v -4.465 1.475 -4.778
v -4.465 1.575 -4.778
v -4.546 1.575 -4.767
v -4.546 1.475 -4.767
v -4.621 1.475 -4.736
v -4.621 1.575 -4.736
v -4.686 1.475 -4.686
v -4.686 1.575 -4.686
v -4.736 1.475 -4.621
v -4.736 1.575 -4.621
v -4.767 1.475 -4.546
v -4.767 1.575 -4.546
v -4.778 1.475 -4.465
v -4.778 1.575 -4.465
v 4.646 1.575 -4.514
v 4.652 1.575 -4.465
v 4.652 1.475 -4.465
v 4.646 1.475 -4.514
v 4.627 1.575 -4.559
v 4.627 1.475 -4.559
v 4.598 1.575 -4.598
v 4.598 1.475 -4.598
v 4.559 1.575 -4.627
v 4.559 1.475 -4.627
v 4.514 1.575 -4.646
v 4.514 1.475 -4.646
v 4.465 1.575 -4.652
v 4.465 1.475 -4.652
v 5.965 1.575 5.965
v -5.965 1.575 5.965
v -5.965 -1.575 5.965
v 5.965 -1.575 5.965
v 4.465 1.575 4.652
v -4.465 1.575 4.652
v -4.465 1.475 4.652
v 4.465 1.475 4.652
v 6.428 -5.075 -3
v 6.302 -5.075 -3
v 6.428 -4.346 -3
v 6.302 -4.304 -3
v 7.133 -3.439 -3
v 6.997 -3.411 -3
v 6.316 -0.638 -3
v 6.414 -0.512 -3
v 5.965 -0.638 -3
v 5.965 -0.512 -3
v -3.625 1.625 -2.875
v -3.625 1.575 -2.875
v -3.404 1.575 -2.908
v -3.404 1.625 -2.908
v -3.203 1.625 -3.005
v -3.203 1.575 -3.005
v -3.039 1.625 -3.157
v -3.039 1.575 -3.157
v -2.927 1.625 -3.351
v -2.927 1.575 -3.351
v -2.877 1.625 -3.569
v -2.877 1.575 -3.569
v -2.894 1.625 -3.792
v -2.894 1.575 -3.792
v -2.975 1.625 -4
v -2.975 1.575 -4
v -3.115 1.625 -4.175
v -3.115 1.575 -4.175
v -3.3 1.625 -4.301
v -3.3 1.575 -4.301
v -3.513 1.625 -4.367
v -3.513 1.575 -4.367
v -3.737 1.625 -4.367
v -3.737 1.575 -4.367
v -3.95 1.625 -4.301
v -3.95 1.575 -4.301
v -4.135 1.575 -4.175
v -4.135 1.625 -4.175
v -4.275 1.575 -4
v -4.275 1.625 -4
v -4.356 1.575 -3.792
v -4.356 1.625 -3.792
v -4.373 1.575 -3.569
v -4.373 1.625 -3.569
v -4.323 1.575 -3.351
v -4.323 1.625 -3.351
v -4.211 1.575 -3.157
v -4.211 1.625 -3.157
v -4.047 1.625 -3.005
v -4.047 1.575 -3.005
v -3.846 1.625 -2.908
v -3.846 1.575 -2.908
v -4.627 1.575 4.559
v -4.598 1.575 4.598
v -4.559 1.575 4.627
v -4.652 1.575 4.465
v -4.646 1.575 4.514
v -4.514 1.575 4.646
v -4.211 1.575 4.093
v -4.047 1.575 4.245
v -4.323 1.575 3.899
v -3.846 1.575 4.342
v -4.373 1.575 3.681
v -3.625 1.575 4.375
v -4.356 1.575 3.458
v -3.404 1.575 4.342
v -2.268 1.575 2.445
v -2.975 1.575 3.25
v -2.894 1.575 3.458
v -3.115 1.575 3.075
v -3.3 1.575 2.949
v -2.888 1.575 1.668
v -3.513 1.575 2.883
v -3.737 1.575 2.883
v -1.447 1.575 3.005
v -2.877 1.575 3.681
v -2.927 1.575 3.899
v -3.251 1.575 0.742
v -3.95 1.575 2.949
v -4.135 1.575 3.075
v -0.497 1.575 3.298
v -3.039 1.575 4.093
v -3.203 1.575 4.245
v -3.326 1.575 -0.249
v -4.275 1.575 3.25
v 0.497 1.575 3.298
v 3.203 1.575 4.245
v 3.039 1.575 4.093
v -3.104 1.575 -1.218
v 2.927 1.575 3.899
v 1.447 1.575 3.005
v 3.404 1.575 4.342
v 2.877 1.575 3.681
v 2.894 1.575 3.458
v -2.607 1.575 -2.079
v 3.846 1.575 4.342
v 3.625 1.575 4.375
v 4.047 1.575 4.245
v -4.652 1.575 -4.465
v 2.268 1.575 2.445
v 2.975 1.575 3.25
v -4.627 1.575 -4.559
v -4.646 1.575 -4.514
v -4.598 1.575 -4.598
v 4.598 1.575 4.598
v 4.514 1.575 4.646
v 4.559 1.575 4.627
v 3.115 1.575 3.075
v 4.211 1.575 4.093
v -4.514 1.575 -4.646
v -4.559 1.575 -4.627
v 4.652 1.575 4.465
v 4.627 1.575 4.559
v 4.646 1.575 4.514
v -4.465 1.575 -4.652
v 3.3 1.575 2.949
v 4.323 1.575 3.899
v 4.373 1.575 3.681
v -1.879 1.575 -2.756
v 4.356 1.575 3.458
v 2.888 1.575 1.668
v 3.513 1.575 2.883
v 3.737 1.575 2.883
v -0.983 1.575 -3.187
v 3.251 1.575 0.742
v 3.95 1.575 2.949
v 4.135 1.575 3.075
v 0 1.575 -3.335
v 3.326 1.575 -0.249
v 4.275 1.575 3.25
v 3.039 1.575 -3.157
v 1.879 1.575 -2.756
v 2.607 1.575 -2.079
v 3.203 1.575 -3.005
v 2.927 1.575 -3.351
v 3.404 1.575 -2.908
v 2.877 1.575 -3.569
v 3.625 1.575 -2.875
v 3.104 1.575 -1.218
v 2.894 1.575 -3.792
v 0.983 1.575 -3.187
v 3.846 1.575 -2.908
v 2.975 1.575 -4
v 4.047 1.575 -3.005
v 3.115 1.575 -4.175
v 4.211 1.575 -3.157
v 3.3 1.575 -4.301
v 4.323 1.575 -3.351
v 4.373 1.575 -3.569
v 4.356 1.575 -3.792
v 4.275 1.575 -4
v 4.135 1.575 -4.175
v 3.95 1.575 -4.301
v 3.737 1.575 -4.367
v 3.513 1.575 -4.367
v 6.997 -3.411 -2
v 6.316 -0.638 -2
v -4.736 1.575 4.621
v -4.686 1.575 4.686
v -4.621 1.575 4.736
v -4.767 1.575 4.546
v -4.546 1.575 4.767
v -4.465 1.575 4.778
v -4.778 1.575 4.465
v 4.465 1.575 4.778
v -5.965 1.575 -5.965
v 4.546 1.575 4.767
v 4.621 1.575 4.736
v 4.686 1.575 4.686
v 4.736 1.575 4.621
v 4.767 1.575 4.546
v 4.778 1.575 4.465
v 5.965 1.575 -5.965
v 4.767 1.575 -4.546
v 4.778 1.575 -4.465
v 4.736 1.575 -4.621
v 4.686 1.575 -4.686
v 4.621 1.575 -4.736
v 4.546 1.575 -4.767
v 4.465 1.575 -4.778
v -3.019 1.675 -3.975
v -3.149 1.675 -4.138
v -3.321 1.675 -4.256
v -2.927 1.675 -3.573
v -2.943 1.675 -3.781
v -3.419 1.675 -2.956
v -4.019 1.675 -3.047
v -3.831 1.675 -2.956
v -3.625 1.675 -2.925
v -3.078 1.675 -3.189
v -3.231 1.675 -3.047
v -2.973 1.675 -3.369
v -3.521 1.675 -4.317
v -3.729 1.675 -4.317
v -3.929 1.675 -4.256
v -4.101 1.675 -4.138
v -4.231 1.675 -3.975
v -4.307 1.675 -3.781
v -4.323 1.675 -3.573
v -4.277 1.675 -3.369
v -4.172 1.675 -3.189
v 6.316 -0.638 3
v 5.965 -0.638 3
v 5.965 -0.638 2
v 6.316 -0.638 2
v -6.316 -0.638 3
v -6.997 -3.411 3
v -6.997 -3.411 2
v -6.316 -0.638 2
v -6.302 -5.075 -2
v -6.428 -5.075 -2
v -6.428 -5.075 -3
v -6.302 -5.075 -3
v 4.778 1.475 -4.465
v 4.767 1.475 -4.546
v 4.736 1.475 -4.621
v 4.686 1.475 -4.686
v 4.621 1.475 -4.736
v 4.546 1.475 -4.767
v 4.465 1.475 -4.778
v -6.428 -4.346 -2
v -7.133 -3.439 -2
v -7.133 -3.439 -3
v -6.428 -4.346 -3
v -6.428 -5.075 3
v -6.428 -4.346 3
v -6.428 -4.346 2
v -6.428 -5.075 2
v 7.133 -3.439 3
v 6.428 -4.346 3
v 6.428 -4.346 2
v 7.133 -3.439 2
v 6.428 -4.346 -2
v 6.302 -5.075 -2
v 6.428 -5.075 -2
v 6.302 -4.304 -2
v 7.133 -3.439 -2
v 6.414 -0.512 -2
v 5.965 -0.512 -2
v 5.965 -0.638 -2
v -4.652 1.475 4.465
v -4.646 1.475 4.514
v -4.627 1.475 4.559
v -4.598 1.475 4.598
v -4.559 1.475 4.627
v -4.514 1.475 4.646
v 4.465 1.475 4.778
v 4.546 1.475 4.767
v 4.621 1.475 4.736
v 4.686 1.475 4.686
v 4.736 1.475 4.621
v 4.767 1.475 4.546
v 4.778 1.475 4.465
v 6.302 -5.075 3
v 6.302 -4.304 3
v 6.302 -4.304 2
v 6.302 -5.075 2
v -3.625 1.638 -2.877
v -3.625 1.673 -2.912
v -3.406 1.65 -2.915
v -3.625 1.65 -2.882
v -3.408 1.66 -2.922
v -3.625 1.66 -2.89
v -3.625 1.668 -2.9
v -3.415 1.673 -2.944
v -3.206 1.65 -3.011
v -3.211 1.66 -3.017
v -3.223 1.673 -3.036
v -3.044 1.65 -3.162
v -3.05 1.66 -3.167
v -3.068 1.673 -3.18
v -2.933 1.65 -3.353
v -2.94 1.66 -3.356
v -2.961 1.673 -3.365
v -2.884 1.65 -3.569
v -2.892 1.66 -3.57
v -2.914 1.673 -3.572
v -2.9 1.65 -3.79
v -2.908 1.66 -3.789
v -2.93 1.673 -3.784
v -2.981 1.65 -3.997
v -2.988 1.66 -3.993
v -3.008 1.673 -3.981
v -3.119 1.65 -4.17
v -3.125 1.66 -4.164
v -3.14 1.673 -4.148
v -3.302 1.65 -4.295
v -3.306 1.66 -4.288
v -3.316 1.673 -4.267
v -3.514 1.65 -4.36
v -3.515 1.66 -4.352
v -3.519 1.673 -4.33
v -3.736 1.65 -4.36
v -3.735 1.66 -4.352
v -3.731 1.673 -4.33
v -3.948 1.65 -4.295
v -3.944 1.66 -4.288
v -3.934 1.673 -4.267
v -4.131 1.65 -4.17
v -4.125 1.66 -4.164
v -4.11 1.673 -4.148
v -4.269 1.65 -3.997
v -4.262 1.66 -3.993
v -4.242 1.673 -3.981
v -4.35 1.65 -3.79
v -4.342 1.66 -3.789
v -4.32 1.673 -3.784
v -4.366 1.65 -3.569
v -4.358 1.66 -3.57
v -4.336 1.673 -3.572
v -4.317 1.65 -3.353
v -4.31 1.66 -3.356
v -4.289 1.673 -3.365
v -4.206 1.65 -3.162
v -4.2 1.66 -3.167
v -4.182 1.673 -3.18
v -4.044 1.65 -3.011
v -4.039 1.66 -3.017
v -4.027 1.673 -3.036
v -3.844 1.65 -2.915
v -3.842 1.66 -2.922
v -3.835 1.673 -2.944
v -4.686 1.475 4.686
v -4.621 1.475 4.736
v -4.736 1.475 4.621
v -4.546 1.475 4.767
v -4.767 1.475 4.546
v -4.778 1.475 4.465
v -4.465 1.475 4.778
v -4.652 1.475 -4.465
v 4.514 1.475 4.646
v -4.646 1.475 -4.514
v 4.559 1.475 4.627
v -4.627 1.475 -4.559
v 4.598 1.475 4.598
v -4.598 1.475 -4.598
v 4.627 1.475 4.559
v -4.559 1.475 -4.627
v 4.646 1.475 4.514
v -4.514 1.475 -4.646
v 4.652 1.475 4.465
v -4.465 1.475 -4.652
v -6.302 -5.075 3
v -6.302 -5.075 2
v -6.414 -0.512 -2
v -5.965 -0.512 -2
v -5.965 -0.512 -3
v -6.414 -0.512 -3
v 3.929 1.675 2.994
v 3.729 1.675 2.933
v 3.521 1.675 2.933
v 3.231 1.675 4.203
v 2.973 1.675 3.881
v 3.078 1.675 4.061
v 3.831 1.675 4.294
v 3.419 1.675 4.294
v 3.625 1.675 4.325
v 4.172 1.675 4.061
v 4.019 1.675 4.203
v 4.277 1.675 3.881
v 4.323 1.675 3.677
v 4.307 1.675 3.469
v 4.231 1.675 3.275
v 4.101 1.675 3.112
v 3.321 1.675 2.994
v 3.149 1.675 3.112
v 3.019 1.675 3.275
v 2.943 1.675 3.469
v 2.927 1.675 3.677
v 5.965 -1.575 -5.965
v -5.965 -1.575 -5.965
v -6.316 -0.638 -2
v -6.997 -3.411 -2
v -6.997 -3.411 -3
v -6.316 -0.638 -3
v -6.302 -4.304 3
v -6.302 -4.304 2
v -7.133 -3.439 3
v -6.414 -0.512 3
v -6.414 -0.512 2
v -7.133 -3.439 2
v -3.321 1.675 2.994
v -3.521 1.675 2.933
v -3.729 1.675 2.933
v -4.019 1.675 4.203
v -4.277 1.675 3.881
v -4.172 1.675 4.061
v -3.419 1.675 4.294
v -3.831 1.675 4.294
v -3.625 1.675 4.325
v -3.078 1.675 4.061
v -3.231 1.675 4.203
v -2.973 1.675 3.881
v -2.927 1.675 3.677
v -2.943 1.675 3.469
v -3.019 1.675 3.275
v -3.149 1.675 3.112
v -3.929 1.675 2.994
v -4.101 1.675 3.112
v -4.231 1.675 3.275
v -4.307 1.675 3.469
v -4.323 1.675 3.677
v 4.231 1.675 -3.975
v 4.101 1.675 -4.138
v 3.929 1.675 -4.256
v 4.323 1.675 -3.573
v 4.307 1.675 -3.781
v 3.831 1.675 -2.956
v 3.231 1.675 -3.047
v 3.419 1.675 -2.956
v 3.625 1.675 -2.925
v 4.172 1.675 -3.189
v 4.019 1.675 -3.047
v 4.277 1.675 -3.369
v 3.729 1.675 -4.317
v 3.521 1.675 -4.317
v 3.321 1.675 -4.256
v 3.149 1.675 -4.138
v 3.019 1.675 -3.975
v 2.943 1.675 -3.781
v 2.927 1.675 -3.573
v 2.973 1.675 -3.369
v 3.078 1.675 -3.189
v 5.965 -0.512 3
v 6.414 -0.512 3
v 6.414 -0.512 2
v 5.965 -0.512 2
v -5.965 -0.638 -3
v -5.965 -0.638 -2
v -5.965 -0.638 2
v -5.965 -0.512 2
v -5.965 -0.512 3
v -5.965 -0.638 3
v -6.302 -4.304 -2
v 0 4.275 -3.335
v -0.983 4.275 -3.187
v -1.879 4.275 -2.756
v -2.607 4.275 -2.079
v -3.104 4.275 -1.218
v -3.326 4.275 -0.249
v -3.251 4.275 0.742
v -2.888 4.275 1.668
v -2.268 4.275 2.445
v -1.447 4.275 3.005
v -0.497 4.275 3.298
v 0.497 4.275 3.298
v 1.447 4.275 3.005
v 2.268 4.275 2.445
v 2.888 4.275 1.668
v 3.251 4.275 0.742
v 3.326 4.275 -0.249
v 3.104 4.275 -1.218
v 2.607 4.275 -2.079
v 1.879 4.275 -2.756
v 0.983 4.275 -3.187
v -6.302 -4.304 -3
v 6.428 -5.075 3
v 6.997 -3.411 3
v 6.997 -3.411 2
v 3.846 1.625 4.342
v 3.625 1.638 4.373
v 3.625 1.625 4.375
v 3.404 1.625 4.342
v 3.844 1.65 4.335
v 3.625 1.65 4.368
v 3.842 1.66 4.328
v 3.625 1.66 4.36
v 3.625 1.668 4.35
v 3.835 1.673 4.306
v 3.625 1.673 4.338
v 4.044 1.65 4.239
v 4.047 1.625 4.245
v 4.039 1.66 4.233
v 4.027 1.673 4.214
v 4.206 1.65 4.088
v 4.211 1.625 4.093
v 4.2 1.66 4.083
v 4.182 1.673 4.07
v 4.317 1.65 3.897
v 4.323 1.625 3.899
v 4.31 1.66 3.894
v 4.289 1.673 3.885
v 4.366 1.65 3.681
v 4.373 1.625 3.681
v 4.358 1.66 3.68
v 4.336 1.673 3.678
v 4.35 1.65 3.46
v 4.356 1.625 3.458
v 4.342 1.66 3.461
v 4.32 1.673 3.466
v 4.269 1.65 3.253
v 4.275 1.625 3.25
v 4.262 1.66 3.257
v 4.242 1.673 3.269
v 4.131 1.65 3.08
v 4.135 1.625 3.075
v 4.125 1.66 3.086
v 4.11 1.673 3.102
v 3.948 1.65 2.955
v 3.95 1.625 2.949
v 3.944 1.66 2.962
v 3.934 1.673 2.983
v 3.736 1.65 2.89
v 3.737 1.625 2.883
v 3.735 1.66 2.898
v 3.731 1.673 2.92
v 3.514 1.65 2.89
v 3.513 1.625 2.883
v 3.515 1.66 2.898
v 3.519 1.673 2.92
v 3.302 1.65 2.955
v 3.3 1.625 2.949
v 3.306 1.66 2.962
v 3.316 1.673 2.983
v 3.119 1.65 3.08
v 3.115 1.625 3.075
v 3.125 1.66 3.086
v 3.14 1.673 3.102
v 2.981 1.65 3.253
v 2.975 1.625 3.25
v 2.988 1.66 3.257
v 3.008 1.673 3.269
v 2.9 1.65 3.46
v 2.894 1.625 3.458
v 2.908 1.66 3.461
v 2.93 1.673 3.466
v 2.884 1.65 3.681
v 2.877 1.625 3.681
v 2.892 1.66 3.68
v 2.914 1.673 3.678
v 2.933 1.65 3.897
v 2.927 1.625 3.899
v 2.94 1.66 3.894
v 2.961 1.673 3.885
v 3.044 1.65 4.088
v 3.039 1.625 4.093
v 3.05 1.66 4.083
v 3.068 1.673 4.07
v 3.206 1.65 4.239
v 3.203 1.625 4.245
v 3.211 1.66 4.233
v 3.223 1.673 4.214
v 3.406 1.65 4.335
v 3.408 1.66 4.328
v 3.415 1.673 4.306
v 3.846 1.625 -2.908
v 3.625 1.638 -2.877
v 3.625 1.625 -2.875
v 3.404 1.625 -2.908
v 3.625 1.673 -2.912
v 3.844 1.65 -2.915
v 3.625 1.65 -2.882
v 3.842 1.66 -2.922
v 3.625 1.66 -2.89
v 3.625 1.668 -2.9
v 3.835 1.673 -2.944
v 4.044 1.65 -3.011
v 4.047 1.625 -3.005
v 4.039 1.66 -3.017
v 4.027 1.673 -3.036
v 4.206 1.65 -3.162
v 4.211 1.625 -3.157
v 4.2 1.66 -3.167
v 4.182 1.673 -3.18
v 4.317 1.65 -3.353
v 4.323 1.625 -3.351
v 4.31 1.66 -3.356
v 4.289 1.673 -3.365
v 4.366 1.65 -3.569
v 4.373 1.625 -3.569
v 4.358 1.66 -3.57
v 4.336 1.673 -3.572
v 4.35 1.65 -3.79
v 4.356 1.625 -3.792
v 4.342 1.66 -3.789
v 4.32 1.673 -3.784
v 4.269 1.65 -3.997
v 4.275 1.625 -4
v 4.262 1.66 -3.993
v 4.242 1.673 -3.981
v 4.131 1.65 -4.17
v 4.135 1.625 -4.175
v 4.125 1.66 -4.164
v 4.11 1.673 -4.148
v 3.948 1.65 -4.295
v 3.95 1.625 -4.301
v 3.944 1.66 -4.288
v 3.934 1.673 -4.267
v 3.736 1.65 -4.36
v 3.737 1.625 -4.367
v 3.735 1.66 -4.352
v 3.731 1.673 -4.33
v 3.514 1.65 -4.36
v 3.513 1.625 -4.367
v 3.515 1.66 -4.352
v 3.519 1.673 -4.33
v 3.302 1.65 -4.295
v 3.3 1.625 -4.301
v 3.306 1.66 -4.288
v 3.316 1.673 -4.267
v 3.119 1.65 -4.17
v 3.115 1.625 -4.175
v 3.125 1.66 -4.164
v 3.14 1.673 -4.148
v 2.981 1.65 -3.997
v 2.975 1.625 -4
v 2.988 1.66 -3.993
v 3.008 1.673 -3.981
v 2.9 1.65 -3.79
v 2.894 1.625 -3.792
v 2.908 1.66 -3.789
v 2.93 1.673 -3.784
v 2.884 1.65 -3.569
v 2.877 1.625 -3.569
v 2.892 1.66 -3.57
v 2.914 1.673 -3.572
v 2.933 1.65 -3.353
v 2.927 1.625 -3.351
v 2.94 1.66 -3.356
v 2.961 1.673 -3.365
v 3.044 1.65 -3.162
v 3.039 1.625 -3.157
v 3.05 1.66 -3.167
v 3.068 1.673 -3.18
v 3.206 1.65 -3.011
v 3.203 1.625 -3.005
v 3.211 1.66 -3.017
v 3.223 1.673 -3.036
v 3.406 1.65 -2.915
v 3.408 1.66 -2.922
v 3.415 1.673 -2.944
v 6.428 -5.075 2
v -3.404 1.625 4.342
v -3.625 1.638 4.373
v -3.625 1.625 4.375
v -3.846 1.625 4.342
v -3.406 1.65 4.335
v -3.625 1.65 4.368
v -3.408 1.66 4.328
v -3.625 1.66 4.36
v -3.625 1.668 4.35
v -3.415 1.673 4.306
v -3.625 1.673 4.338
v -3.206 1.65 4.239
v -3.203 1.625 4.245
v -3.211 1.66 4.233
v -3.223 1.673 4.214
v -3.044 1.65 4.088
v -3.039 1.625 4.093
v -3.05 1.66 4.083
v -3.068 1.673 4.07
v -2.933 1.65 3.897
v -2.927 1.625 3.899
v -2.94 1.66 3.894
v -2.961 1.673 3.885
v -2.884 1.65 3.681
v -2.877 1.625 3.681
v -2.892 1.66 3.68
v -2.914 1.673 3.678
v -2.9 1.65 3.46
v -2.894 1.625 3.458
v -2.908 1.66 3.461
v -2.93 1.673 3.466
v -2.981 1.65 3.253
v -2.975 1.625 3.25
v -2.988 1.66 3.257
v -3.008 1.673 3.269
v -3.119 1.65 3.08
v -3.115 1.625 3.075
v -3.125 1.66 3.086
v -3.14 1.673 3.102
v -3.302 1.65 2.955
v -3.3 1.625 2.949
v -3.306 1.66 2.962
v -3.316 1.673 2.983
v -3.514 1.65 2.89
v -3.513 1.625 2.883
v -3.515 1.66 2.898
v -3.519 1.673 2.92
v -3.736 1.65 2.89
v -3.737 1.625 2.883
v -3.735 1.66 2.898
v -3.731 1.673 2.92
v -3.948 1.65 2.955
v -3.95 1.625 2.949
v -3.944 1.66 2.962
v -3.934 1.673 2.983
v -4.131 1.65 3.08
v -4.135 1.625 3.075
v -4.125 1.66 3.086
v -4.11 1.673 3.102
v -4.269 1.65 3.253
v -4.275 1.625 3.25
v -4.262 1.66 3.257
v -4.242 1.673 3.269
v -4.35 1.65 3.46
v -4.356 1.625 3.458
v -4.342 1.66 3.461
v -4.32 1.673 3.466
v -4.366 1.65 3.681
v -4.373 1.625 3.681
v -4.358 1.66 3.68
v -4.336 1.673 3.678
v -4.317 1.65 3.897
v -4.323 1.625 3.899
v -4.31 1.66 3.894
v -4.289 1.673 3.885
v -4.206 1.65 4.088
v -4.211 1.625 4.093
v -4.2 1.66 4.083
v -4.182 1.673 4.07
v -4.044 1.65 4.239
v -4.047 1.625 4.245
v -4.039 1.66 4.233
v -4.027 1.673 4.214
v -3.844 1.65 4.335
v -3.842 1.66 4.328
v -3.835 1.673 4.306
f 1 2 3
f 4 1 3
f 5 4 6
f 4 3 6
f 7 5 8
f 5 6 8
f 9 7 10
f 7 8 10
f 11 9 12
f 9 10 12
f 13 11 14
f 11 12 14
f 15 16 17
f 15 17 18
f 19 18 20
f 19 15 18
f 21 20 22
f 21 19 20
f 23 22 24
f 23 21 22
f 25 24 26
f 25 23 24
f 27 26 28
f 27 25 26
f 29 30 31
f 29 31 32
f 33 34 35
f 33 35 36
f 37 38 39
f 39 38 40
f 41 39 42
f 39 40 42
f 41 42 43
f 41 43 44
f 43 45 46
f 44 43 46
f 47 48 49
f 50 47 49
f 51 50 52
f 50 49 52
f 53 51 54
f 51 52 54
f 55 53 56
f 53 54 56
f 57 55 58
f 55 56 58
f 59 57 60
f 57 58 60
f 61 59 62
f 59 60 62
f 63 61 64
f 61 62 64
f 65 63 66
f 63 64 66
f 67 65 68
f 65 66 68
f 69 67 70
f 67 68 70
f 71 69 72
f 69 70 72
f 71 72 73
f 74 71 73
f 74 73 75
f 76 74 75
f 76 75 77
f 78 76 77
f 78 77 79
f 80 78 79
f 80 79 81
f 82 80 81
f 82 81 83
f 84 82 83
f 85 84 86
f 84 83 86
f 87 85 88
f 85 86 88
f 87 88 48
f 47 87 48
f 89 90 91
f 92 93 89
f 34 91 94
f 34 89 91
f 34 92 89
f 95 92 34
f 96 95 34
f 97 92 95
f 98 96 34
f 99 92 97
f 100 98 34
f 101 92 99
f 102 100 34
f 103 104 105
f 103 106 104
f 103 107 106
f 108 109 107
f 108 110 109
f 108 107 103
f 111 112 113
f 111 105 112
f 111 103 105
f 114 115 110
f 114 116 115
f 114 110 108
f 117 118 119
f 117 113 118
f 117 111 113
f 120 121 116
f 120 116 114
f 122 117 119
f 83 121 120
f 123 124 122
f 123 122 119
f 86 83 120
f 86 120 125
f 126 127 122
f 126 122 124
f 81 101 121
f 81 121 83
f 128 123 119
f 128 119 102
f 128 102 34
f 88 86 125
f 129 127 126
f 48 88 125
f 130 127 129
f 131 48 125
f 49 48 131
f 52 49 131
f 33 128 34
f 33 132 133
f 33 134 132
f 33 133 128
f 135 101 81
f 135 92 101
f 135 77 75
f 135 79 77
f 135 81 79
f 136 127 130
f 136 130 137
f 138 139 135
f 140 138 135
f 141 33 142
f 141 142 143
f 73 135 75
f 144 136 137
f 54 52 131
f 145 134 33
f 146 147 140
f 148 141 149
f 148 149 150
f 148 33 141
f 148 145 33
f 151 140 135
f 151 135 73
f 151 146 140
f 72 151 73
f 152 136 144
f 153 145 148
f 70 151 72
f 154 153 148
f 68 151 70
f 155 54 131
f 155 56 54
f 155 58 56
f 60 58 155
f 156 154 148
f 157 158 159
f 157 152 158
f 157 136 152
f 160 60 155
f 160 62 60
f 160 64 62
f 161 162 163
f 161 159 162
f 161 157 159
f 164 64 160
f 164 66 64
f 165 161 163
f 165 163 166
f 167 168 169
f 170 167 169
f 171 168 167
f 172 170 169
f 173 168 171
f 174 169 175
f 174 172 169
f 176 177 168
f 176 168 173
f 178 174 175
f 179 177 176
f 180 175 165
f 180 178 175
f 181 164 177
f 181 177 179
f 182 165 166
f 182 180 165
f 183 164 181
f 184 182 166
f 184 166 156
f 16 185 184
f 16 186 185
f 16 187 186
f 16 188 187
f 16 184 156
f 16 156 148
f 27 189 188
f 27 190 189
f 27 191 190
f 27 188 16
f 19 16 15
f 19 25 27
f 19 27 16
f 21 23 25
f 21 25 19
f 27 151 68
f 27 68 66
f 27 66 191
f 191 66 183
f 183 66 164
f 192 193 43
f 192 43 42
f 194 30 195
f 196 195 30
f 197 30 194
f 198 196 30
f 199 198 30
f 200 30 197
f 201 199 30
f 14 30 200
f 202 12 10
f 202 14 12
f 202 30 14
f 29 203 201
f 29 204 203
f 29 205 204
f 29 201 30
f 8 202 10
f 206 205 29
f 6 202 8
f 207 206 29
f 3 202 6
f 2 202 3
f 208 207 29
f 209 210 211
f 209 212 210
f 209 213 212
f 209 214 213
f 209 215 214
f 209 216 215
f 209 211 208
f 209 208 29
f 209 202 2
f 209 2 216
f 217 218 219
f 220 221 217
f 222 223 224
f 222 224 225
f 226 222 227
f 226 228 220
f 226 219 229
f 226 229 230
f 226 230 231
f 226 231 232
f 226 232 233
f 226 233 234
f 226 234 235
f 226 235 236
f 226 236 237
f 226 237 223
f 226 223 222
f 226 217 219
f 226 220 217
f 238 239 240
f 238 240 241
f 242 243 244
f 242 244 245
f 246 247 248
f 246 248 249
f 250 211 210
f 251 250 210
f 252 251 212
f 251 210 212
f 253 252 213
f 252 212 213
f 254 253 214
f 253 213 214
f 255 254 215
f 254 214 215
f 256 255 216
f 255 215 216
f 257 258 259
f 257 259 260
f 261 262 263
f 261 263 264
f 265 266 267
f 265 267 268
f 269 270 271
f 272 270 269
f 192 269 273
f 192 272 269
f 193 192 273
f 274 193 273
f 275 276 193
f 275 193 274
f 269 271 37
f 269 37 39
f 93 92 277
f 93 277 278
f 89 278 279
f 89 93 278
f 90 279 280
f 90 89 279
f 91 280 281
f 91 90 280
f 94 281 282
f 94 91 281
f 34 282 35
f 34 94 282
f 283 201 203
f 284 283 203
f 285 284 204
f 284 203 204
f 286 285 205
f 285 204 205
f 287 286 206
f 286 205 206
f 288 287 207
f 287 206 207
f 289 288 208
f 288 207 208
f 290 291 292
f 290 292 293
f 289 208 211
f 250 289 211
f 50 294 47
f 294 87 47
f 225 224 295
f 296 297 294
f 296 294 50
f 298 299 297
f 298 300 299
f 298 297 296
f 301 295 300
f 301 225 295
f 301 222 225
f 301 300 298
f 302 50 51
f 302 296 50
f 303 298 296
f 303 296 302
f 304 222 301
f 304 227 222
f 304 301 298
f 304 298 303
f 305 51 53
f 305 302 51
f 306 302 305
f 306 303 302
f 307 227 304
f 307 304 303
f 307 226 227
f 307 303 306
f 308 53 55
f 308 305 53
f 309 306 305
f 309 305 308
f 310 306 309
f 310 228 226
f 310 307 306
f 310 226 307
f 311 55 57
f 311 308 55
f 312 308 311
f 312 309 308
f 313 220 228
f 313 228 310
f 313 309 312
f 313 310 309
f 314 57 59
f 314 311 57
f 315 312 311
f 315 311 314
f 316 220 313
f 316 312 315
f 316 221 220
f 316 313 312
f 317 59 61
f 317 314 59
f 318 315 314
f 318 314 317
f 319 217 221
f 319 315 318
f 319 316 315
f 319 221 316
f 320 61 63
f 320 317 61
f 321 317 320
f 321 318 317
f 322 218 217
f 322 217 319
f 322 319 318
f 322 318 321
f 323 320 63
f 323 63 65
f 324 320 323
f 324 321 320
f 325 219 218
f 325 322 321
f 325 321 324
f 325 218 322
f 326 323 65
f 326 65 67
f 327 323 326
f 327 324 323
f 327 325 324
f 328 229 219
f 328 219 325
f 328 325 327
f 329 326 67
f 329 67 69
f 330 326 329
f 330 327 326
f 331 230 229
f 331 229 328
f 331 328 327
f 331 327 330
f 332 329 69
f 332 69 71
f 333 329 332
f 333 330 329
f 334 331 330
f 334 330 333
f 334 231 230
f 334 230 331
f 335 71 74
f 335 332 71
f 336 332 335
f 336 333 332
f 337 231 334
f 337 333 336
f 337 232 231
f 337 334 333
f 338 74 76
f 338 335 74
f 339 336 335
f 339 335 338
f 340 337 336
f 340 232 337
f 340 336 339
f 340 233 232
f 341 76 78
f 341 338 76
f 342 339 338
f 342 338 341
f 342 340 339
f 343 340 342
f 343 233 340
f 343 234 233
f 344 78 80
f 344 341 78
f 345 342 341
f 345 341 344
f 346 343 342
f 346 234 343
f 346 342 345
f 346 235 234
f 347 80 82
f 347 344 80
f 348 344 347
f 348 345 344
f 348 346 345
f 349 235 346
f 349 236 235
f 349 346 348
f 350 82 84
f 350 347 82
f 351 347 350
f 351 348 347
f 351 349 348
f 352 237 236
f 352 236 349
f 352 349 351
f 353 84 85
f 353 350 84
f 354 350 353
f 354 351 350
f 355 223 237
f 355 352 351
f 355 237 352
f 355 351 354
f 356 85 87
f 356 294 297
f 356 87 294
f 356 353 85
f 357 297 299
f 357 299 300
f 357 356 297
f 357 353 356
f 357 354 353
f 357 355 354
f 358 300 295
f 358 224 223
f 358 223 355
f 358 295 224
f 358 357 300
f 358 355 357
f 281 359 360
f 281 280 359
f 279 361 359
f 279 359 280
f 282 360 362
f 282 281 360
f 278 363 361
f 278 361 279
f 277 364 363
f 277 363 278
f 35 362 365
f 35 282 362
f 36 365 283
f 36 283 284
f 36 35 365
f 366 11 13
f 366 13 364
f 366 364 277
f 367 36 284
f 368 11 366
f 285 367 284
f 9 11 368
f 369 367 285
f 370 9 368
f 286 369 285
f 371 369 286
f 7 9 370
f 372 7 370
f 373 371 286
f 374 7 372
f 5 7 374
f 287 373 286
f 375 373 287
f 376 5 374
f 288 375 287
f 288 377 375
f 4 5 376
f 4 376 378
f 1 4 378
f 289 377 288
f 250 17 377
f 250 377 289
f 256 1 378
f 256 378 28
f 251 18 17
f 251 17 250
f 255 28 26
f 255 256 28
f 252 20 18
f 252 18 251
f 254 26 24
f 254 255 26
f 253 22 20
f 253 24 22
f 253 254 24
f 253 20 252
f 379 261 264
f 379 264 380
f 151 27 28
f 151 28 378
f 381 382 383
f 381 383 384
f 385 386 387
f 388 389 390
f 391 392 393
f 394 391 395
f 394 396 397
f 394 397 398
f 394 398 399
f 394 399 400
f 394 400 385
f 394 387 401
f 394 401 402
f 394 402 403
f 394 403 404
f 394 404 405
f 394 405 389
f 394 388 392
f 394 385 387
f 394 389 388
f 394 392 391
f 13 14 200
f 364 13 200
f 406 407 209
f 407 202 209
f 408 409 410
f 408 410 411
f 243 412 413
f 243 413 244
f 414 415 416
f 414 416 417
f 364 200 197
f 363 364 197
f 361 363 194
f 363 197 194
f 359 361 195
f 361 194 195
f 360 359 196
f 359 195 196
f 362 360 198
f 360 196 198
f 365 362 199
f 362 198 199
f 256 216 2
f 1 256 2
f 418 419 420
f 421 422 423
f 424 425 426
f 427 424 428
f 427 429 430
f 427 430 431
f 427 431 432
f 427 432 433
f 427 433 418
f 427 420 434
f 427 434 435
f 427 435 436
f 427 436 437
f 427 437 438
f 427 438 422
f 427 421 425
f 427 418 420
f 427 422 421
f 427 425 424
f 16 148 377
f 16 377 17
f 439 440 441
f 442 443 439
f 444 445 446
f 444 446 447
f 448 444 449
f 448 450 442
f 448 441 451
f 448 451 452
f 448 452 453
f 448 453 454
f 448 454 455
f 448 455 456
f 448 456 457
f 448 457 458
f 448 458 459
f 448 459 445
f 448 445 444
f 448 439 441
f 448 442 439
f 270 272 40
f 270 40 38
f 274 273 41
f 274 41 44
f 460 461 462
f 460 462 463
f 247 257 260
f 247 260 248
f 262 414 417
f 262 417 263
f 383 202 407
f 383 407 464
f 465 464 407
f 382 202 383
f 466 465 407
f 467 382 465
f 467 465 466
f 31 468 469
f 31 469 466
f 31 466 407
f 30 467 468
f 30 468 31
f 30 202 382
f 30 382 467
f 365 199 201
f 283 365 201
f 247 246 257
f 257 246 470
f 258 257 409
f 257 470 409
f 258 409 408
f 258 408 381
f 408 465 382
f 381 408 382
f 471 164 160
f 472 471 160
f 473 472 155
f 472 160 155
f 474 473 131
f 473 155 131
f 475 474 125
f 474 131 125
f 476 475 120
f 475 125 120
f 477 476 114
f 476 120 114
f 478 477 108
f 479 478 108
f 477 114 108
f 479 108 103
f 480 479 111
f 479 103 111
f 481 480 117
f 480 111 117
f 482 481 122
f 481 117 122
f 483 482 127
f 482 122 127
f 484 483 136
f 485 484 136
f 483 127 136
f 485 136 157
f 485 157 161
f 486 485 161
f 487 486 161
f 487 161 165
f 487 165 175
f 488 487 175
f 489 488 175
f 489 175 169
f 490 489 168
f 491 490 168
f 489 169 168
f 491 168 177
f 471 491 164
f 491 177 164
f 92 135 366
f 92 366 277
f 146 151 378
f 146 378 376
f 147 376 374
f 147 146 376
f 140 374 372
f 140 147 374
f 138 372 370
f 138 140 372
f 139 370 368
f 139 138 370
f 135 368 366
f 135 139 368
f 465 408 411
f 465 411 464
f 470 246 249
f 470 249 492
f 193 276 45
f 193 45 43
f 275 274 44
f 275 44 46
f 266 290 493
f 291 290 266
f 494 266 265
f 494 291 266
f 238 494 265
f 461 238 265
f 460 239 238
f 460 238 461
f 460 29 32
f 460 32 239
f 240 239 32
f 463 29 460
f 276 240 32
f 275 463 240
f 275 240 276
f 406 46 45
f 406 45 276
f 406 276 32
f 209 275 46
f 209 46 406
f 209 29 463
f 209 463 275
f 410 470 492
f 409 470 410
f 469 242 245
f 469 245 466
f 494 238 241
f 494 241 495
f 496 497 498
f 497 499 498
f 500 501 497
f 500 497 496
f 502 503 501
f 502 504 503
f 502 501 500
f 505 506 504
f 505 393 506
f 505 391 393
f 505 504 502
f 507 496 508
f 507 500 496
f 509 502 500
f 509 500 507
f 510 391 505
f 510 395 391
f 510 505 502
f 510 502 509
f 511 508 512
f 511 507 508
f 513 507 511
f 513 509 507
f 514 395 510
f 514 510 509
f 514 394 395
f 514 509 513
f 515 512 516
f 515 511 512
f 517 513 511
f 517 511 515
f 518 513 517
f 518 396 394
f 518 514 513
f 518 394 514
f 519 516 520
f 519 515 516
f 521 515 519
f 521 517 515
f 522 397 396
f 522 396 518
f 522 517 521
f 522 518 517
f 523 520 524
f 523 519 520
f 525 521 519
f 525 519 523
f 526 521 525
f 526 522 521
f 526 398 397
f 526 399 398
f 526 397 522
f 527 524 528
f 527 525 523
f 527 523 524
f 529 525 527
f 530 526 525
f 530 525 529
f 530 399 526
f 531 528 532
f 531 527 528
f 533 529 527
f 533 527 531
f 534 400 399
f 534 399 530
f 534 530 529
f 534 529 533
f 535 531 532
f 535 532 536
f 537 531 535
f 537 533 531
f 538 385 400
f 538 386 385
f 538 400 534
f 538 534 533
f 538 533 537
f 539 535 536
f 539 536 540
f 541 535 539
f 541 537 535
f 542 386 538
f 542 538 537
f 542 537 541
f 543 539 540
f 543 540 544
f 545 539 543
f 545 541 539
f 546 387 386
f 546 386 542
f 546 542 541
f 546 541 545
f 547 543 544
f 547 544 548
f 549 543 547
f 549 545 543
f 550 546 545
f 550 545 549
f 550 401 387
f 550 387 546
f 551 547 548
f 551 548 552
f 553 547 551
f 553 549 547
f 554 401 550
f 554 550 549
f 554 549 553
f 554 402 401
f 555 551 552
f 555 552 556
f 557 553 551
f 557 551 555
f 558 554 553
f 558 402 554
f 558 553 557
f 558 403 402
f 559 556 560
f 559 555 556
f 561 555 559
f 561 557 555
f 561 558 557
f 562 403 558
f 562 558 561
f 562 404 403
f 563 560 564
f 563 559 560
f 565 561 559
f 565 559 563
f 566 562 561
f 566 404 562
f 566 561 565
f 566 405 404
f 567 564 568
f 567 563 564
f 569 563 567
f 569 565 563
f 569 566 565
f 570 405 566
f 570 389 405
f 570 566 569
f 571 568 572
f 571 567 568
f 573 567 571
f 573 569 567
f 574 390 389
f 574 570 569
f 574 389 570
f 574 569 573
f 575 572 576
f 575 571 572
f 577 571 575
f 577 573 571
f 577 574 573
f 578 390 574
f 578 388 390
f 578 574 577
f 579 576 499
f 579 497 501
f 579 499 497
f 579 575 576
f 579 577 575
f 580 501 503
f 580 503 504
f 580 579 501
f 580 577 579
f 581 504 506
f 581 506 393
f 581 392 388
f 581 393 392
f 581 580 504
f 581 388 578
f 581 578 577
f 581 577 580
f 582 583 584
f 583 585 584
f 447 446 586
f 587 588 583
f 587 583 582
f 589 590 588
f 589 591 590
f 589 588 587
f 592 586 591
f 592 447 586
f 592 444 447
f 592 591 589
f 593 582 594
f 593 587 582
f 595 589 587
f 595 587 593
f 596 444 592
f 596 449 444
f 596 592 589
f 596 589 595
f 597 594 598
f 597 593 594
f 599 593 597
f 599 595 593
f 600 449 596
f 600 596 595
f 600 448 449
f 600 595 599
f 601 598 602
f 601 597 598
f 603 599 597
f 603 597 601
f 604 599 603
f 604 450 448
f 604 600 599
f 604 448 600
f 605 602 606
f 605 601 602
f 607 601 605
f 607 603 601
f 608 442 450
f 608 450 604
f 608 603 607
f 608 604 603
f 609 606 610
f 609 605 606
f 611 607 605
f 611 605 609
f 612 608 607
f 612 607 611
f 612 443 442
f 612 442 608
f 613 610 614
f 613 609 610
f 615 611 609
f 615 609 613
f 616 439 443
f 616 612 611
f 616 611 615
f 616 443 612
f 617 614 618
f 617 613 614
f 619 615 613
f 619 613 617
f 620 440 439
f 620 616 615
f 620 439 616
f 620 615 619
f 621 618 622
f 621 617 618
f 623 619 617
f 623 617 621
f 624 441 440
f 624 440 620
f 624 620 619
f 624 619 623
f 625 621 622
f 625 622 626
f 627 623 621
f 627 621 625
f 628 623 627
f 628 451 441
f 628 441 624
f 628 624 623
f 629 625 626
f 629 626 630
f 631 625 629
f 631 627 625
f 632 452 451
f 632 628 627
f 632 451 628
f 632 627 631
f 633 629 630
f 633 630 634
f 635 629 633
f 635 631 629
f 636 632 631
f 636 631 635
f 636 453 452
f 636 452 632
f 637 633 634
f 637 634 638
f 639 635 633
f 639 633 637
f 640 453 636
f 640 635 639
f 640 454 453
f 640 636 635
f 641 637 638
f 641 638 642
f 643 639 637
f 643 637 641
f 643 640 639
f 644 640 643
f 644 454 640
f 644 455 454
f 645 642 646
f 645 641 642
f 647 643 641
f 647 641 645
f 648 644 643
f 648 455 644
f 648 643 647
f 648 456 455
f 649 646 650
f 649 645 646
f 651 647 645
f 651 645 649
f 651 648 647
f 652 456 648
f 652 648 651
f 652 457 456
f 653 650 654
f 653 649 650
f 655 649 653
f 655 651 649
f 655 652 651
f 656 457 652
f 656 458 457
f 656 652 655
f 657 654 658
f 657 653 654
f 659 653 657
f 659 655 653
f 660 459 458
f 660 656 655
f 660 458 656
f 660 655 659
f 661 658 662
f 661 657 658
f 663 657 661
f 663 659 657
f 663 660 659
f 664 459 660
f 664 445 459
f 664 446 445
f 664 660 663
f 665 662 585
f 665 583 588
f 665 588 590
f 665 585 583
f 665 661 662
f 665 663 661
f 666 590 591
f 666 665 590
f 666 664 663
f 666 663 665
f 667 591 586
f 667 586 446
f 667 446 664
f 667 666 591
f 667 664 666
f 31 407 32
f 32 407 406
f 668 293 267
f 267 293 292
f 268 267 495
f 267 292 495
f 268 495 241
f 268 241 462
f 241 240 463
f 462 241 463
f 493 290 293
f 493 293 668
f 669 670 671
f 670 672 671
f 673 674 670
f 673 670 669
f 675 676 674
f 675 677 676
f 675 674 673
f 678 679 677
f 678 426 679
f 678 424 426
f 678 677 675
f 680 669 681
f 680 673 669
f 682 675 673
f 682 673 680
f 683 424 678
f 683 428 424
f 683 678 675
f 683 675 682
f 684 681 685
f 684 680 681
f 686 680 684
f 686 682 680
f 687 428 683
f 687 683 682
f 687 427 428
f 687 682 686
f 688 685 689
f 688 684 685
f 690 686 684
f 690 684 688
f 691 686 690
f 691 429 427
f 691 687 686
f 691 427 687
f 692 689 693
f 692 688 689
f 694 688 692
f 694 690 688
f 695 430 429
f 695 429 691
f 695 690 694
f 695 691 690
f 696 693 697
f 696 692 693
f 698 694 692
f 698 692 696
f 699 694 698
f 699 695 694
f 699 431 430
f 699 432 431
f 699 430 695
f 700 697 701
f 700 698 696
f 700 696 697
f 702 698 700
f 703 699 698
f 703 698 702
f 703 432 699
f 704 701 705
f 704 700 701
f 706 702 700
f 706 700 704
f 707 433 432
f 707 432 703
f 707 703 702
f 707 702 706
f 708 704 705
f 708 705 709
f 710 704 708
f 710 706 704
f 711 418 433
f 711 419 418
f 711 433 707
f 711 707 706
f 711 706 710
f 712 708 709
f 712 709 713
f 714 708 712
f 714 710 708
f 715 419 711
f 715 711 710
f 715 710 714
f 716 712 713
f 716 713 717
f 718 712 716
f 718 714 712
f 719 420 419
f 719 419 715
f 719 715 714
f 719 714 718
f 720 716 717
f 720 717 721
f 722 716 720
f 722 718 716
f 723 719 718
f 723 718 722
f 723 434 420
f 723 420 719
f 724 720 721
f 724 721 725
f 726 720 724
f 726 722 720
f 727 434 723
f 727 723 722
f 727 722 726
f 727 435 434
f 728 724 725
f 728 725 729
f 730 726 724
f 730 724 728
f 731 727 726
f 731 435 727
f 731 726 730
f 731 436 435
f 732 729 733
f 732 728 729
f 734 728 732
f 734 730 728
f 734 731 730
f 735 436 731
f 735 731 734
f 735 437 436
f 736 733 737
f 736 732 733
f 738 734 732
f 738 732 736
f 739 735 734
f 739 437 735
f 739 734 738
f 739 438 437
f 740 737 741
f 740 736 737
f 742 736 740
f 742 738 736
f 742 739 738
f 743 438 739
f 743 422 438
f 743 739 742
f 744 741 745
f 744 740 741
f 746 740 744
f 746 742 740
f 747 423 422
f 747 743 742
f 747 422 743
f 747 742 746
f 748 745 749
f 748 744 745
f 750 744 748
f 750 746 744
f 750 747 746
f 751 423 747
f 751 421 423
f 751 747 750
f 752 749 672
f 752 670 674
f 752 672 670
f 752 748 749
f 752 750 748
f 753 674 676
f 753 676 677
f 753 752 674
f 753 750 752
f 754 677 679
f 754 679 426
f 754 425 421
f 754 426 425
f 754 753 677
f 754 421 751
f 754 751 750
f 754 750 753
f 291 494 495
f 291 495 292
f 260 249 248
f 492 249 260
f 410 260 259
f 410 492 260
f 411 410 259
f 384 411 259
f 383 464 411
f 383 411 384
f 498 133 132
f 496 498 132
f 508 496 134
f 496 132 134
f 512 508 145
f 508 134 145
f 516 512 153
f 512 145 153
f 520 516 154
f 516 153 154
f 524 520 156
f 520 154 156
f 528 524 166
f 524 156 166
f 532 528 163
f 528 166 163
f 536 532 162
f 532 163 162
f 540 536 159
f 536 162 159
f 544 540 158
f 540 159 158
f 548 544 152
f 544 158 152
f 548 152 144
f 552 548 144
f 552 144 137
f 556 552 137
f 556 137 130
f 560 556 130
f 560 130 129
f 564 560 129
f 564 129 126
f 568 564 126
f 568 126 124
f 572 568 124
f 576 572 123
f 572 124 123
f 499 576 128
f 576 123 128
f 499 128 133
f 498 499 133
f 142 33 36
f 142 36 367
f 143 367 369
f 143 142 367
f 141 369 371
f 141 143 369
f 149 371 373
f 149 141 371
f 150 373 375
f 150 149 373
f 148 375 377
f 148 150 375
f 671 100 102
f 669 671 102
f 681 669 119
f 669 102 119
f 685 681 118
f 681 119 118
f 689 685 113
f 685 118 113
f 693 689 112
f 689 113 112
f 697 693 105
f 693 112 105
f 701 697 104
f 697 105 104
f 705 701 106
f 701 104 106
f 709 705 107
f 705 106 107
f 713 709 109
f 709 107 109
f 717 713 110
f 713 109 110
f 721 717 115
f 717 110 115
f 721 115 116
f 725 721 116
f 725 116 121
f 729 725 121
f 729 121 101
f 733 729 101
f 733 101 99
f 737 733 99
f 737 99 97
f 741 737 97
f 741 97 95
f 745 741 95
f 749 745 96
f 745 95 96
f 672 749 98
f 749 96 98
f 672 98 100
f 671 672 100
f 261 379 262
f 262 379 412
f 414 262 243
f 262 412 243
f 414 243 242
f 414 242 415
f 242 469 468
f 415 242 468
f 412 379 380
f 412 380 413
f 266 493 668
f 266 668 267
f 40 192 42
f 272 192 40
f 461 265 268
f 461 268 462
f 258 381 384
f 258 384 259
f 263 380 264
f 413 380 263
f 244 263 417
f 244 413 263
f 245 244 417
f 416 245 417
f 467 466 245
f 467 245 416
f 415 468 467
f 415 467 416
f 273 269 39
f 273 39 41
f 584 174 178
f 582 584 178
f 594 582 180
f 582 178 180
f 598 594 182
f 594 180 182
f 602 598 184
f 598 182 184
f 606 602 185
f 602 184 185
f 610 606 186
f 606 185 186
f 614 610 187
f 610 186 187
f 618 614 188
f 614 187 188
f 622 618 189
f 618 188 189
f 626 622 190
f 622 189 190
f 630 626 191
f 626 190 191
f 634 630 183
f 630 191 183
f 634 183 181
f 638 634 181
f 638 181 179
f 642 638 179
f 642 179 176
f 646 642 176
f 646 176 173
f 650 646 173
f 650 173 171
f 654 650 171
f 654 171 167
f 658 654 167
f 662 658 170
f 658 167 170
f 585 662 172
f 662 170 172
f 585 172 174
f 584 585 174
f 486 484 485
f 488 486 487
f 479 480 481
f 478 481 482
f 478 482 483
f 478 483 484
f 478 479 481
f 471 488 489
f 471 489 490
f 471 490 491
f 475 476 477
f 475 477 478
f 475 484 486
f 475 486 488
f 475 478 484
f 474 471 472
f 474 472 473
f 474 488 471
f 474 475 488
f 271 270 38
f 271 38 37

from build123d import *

# Parameters (mm, degrees)
SKETCH1_W               = 11.93
SKETCH1_H               = 11.93
BOSS_EXTRUDE1_DEPTH     = 1.575
CUT_EXTRUDE_THIN1_DEPTH = 0.1
SKETCH3_R               = 0.75
BOSS_EXTRUDE2_DEPTH     = 0.1
FILLET1_R               = 0.05
SKETCH4_R               = 3.335
BOSS_EXTRUDE3_DEPTH     = 2.7
EXTRUDE_THIN1_DEPTH     = 11.92
SKETCH6_W               = 4
SKETCH6_H               = 7.725942516
SKETCH6_W_2             = 4.750048421
CUT_EXTRUDE1_DEPTH      = 16.26080664
SKETCH7_W               = 4.750048421
SKETCH7_H               = 7.725942516
SKETCH7_W_2             = 4
CUT_EXTRUDE2_DEPTH      = 16.26080664


with BuildPart() as part:
    # Sketch1 → Boss-Extrude1 (new, symmetric)
    with BuildSketch(Plane(origin=(0, 0, 0), x_dir=(1, 0, 0), z_dir=(0, 1, 0))):
        Rectangle(SKETCH1_W, SKETCH1_H)
    extrude(amount=BOSS_EXTRUDE1_DEPTH, both=True)

    # Sketch2 → Cut-Extrude-Thin1 (cut)
    with BuildSketch(Plane(origin=(0, 1.575, 0), x_dir=(1, 0, 0), z_dir=(0, 1, 0))):
        with BuildLine():
            Line((4.465, 4.7775), (-4.465, 4.7775))
            ThreePointArc((-4.465, 4.7775), (-4.685970869, 4.685970869), (-4.7775, 4.465))
            Line((-4.7775, 4.465), (-4.7775, -4.465))
            ThreePointArc((-4.7775, -4.465), (-4.685970869, -4.685970869), (-4.465, -4.7775))
            Line((-4.465, -4.7775), (4.465, -4.7775))
            ThreePointArc((4.465, -4.7775), (4.685970869, -4.685970869), (4.7775, -4.465))
            Line((4.7775, -4.465), (4.7775, 4.465))
            ThreePointArc((4.7775, 4.465), (4.685970869, 4.685970869), (4.465, 4.7775))
        make_face()
        with BuildLine():
            Line((4.465, 4.6525), (-4.465, 4.6525))
            ThreePointArc((-4.465, 4.6525), (-4.597582521, 4.597582521), (-4.6525, 4.465))
            Line((-4.6525, 4.465), (-4.6525, -4.465))
            ThreePointArc((-4.6525, -4.465), (-4.597582521, -4.597582521), (-4.465, -4.6525))
            Line((-4.465, -4.6525), (4.465, -4.6525))
            ThreePointArc((4.465, -4.6525), (4.597582521, -4.597582521), (4.6525, -4.465))
            Line((4.6525, -4.465), (4.6525, 4.465))
            ThreePointArc((4.6525, 4.465), (4.597582521, 4.597582521), (4.465, 4.6525))
        make_face(mode=Mode.SUBTRACT)
    extrude(amount=-CUT_EXTRUDE_THIN1_DEPTH, mode=Mode.SUBTRACT)

    # Sketch3 → Boss-Extrude2 (add)
    with BuildSketch(Plane(origin=(0, 1.575, 0), x_dir=(1, 0, 0), z_dir=(0, 1, 0))):
        with Locations(Location((-3.625, 3.625, 0), (0, 0, 270))):
            Circle(SKETCH3_R)
        with Locations(Location((3.625, 3.625, 0), (0, 0, 270))):
            Circle(SKETCH3_R)
        with Locations(Location((3.625, -3.625, 0), (0, 0, 270))):
            Circle(SKETCH3_R)
        with Locations(Location((-3.625, -3.625, 0), (0, 0, 270))):
            Circle(SKETCH3_R)
    extrude(amount=BOSS_EXTRUDE2_DEPTH)

    # Fillet1
    fillet1_edges = [part.edges().sort_by_distance(p)[0] for p in [
        (-3.625, 1.675, -4.375),
        (3.625, 1.675, -4.375),
        (3.625, 1.675, 2.875),
        (-3.625, 1.675, 2.875),
    ]]
    fillet(fillet1_edges, radius=FILLET1_R)

    # Sketch4 → Boss-Extrude3 (add)
    with BuildSketch(Plane(origin=(0, 1.575, 0), x_dir=(1, 0, 0), z_dir=(0, 1, 0))):
        with Locations(Location((0, 0, 0), (0, 0, 90))):
            Circle(SKETCH4_R)
    extrude(amount=BOSS_EXTRUDE3_DEPTH)

    # Sketch5 → Extrude-Thin1 (add)
    with BuildSketch(Plane.XY.offset(5.965)):
        Polygon((-6.3025, -5.075), (-6.3025, -4.303555766), (-6.997085308, -3.410517513), (-6.315993287, -0.6375), (6.315993287, -0.6375), (6.997085308, -3.410517513), (6.3025, -4.303555766), (6.3025, -5.075), (6.4275, -5.075), (6.4275, -4.346444234), (7.132914692, -3.439482487), (6.414006713, -0.5125), (-6.414006713, -0.5125), (-7.132914692, -3.439482487), (-6.4275, -4.346444234), (-6.4275, -5.075), align=None)
    extrude(amount=-EXTRUDE_THIN1_DEPTH)

    # Sketch6 → Cut-Extrude1 (cut, through all)
    with BuildSketch(Plane(origin=(5.965, 0, 0), x_dir=(0, 0, -1), z_dir=(1, 0, 0))):
        with Locations((0, -1.737877721)):
            Rectangle(SKETCH6_W, SKETCH6_H)
        with Locations((-5.375024211, -1.737877721)):
            Rectangle(SKETCH6_W_2, SKETCH6_H)
        with Locations((5.375024211, -1.737877721)):
            Rectangle(SKETCH6_W_2, SKETCH6_H)
    extrude(amount=CUT_EXTRUDE1_DEPTH, mode=Mode.SUBTRACT)

    # Sketch7 → Cut-Extrude2 (cut, through all)
    with BuildSketch(Plane.ZY.offset(5.965)):
        with Locations((-5.375024211, -1.737877721)):
            Rectangle(SKETCH7_W, SKETCH7_H)
        with Locations((5.375024211, -1.737877721)):
            Rectangle(SKETCH7_W, SKETCH7_H)
        with Locations((0, -1.737877721)):
            Rectangle(SKETCH7_W_2, SKETCH7_H)
    extrude(amount=CUT_EXTRUDE2_DEPTH, mode=Mode.SUBTRACT)


solid = part.part
